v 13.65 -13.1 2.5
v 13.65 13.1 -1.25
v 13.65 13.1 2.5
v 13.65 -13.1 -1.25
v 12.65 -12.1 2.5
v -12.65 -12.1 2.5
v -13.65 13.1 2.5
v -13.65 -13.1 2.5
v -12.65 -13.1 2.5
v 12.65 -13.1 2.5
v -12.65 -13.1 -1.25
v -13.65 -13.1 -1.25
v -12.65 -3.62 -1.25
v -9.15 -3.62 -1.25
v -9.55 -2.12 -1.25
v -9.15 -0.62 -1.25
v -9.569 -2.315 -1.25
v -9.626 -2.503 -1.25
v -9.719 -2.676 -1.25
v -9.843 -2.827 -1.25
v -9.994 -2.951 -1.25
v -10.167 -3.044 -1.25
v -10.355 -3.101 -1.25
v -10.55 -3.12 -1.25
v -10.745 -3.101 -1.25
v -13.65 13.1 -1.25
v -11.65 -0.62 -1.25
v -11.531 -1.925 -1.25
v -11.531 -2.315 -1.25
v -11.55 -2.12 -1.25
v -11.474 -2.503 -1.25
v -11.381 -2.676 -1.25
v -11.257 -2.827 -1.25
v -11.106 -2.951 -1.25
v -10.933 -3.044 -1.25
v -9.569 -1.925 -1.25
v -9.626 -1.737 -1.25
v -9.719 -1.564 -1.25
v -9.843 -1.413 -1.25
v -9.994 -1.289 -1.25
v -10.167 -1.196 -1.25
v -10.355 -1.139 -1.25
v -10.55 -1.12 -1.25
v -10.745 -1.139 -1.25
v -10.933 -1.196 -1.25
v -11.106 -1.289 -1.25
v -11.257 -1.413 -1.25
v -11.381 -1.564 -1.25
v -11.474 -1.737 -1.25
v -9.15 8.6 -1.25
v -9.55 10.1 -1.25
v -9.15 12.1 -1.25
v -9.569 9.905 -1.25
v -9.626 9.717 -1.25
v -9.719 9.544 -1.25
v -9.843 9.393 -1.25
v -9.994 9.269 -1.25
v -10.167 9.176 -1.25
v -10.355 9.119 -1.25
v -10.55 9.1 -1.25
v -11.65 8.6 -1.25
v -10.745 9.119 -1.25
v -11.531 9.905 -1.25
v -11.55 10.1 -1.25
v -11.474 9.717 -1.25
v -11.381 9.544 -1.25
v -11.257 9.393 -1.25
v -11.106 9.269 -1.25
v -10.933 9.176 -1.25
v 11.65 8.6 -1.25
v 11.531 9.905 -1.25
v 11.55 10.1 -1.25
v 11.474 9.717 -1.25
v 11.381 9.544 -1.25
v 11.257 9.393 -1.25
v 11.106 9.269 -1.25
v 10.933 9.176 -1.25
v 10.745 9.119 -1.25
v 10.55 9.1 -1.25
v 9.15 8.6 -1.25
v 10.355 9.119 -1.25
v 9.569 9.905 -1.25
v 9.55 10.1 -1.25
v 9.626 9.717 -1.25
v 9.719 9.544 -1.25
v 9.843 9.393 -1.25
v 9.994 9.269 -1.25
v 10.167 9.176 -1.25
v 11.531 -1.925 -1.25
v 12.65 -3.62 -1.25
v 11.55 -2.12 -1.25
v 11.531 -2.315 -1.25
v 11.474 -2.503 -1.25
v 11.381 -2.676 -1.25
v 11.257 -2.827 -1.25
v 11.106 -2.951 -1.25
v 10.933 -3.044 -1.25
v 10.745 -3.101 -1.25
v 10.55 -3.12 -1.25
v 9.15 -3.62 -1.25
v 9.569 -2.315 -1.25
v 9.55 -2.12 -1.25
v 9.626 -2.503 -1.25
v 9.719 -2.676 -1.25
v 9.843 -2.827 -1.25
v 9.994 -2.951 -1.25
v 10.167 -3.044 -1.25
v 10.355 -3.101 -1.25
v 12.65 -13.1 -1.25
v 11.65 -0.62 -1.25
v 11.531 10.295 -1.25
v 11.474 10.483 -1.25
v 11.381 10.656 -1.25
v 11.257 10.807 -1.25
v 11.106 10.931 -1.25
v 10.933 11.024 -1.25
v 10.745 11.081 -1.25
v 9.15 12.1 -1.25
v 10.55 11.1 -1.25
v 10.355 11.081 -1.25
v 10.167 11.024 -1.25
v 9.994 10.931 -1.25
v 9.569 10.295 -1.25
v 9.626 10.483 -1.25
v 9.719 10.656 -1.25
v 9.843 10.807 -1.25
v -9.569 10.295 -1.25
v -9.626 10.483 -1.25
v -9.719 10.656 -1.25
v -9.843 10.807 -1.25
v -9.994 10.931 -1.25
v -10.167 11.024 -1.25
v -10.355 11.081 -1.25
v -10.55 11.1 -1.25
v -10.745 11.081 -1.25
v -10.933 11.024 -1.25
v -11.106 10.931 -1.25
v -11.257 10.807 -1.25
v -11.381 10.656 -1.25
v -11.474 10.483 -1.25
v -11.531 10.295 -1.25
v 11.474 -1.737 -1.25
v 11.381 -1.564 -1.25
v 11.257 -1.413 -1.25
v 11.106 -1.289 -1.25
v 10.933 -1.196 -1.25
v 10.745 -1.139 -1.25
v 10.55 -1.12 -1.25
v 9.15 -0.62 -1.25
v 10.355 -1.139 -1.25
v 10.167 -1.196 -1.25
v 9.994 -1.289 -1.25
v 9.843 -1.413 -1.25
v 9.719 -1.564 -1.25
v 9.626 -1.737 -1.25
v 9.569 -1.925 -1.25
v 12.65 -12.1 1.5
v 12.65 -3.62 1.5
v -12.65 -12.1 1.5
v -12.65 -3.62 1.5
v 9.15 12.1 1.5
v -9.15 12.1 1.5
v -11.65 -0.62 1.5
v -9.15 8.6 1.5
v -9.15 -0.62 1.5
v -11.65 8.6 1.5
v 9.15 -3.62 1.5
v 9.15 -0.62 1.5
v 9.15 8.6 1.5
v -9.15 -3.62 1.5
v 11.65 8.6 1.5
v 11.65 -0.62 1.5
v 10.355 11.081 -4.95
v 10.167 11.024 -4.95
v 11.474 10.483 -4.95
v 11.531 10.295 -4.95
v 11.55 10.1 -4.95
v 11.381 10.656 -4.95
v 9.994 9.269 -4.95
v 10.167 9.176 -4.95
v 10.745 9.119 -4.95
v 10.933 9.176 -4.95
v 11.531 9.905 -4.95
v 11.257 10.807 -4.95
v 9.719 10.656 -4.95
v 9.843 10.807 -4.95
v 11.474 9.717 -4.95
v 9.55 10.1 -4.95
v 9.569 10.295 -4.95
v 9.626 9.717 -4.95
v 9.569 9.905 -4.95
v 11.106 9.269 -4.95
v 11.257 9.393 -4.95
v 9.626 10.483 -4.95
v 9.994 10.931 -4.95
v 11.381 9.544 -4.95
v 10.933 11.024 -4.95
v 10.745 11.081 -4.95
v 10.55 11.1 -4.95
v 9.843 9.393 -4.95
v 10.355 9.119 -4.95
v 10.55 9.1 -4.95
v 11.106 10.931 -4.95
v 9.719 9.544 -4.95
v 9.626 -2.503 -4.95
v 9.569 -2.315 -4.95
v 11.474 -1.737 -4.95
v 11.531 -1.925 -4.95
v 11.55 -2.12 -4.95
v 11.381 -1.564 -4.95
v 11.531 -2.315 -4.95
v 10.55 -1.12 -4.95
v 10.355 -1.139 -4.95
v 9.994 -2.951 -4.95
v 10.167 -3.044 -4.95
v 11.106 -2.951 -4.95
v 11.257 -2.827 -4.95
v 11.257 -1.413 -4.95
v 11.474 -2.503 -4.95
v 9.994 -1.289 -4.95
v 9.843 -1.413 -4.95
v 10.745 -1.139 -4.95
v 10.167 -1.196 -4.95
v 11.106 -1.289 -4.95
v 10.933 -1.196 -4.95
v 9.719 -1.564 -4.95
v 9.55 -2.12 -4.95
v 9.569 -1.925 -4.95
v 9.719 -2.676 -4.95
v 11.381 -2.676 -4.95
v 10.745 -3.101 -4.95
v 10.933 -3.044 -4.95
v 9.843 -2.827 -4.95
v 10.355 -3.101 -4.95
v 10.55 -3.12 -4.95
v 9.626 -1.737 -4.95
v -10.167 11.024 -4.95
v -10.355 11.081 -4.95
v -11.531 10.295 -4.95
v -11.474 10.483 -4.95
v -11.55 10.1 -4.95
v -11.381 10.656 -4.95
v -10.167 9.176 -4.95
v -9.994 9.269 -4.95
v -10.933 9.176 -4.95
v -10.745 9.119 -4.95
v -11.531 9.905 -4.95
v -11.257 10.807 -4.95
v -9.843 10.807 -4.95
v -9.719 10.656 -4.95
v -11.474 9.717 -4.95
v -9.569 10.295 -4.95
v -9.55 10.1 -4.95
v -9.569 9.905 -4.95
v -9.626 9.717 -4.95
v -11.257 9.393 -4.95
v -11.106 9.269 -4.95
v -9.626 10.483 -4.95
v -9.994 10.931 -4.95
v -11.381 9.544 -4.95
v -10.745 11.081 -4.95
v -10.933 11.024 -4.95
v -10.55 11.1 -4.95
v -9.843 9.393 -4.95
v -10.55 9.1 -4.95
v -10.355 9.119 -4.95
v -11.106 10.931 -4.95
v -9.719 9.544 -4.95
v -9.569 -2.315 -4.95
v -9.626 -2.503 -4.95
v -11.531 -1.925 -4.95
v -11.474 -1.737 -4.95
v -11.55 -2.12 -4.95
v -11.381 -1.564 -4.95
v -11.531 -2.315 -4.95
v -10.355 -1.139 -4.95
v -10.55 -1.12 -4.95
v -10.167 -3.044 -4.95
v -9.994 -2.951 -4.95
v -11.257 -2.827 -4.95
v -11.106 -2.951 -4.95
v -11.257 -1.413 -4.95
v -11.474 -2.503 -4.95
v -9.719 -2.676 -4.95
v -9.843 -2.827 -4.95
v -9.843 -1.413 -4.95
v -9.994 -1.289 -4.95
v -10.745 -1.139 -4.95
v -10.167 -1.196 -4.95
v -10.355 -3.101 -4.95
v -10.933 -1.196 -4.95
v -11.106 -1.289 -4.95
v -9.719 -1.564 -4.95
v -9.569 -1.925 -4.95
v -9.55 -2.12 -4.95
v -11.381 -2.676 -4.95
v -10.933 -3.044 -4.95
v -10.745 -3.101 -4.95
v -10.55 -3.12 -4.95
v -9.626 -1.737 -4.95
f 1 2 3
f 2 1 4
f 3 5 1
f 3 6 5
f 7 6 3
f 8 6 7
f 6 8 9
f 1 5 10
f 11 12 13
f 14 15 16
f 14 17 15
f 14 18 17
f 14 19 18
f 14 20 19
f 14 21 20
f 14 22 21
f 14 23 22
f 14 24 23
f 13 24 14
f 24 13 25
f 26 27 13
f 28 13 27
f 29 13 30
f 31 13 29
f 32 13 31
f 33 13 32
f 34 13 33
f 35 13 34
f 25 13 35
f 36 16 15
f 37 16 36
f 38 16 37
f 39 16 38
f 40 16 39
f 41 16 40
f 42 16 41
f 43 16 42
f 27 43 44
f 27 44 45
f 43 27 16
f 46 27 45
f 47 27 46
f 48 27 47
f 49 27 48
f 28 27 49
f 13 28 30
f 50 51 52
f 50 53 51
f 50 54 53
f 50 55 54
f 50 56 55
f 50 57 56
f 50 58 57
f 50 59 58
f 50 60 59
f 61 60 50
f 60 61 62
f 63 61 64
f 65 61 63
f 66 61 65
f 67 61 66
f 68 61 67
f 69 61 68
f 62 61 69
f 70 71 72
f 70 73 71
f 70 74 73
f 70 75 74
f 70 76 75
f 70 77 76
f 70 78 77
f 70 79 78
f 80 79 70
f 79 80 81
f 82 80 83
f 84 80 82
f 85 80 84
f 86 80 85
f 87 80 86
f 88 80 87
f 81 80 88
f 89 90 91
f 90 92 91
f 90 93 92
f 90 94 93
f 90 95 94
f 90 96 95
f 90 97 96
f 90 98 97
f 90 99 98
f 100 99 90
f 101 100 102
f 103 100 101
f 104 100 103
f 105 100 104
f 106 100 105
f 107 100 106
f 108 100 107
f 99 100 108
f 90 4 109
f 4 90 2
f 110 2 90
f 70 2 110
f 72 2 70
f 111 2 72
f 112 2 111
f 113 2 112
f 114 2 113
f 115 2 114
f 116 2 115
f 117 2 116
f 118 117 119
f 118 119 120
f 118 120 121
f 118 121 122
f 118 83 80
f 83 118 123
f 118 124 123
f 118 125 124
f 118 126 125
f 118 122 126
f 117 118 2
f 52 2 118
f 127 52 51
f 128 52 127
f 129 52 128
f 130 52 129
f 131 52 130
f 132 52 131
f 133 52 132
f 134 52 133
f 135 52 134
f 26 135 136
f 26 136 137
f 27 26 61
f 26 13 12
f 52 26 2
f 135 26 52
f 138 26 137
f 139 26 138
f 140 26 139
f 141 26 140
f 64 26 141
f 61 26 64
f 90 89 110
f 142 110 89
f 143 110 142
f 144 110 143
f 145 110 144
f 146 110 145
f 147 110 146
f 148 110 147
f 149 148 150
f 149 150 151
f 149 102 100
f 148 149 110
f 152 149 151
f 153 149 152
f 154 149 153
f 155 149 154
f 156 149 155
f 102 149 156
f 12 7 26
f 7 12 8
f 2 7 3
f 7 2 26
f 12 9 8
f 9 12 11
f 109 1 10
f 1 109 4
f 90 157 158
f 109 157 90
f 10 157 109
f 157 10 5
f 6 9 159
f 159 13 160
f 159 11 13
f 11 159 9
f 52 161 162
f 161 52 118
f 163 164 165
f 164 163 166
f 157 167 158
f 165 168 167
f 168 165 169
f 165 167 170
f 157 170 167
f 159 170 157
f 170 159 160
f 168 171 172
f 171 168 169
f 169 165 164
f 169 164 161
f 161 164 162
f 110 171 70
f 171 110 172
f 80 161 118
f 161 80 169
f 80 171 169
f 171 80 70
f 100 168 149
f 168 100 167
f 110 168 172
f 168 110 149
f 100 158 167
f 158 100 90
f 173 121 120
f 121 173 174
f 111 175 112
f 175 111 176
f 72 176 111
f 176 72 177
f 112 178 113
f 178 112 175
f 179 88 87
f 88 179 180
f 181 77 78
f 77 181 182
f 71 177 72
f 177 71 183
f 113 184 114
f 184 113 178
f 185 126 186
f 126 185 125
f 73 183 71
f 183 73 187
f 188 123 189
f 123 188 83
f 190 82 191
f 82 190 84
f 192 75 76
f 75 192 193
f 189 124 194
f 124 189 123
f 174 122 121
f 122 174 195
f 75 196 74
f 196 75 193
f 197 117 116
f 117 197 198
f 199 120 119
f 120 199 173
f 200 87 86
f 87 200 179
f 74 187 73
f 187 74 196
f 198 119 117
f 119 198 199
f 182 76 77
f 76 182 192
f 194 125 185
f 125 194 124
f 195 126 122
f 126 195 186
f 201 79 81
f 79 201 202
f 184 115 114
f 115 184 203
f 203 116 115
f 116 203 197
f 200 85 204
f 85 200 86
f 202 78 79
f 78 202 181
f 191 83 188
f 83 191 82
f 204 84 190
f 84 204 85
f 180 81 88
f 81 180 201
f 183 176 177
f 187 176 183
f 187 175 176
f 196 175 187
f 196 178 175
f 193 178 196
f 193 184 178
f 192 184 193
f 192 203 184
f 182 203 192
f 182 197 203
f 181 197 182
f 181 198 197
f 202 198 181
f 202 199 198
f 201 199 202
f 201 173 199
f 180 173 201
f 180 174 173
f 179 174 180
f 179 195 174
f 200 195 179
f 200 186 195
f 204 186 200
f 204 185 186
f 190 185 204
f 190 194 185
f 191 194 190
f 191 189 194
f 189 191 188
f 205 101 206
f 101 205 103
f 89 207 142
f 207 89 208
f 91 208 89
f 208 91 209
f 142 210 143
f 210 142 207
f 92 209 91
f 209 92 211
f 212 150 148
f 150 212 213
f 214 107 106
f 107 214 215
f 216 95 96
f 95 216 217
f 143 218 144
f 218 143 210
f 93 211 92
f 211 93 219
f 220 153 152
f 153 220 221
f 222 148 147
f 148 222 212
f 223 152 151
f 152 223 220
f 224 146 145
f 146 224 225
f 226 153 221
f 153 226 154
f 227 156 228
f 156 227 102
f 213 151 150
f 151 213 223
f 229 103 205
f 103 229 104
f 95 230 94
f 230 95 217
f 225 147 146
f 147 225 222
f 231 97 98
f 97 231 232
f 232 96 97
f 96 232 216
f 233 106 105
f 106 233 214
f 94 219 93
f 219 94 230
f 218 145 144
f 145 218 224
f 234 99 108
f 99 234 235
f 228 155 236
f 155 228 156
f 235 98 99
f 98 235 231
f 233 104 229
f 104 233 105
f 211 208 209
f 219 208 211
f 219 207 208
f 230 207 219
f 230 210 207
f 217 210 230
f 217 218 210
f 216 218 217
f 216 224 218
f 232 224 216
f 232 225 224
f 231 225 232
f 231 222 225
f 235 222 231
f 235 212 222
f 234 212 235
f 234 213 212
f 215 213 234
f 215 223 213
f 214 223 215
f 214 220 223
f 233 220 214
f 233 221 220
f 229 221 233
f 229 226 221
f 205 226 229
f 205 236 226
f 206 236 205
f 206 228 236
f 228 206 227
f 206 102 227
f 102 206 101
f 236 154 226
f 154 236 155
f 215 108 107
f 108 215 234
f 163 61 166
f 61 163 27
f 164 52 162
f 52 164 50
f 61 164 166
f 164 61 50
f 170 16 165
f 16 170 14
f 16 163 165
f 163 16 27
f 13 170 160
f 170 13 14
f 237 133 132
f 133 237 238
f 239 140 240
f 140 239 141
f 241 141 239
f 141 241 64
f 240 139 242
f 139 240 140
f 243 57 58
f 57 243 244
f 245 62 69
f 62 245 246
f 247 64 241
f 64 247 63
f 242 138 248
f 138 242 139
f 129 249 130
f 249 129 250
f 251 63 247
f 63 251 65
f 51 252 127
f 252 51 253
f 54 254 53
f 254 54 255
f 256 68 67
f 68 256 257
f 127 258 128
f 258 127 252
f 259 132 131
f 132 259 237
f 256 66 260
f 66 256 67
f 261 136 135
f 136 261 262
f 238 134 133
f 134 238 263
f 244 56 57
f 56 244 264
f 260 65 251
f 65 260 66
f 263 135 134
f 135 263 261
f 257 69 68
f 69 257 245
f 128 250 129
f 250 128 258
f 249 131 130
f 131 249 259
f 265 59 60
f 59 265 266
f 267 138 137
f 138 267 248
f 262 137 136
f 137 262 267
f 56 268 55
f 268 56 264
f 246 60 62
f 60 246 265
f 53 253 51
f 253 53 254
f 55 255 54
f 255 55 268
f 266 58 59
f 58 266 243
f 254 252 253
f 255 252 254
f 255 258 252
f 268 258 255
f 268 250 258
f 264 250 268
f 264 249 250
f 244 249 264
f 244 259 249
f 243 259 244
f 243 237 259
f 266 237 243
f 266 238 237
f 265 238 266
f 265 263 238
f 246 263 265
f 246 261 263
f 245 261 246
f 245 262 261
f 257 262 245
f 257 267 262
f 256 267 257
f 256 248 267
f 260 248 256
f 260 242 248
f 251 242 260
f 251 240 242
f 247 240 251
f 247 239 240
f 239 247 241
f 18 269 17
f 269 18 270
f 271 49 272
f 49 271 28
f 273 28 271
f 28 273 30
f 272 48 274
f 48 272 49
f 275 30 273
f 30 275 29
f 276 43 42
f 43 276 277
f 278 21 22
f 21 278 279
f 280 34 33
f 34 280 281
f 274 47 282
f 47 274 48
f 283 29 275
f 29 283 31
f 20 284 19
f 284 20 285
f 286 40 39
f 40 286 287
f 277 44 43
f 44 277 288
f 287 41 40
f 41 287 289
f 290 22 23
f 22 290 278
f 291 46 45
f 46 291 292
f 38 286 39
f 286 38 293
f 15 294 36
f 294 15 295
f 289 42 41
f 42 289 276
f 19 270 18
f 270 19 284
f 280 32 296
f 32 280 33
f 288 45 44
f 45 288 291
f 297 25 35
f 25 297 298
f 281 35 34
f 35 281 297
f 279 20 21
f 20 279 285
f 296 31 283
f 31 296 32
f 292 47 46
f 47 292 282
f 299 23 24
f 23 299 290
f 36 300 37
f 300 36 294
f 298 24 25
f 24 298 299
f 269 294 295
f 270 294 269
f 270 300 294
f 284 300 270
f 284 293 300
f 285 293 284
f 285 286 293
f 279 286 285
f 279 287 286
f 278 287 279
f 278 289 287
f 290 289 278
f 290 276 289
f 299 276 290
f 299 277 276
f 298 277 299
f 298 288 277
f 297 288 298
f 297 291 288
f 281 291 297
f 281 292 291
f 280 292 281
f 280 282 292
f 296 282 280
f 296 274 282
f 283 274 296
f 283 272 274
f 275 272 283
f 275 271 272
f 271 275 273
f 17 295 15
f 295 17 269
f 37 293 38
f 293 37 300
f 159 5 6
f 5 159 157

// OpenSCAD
CAMERA_WIDTH = 25.3;
CAMERA_LENGTH = 24.2;
CAMERA_PCB_HEIGHT = 1.7;
CAMERA_PCB_AND_RIBBON_HEIGHT = 4.45;

TOP_THROUGH_HOLE_MARGIN = 1;
THROUGH_HOLE_RADIUS = 1;

translate([0, 0, 2]) {
    cube([CAMERA_WIDTH, CAMERA_LENGTH, 1], center=true);
}

difference() {
    translate([0, 0, 2.5 - (pcb_leeway + 1)/2]) {
        cube([CAMERA_WIDTH + 2, CAMERA_LENGTH + 2, pcb_leeway + 1], center=true);
    }
    translate([0, 0, 2.5 - (pcb_leeway + 1)/2]) {
        cube([CAMERA_WIDTH, CAMERA_LENGTH, pcb_leeway + 2], center=true);
    }
    translate([0, -5, 2.5 - (pcb_leeway + 1)/2]) {
        cube([CAMERA_WIDTH, CAMERA_LENGTH, pcb_leeway + 2], center=true);
    }
}

pcb_leeway = CAMERA_PCB_AND_RIBBON_HEIGHT - CAMERA_PCB_HEIGHT;

peg_length = pcb_leeway + 2 + CAMERA_PCB_HEIGHT;
peg_length_diff = peg_length - pcb_leeway;

module standoffs() {
    translate([CAMERA_WIDTH/2 - 0.5, 4, pcb_leeway/2 - 1.25]) {
        cube([1, 14, pcb_leeway], center=true);
    }

    translate([CAMERA_WIDTH/2 - 1.5, CAMERA_LENGTH/2 - 1.5, pcb_leeway/2 - 1.25]) {
        cube([4, 4, pcb_leeway], center=true);
    }

    translate([CAMERA_WIDTH/2 - 1.5, CAMERA_LENGTH/2 - 1 - 13.22, pcb_leeway/2 - 1.25]) {
        cube([4, 3, pcb_leeway], center=true);
    }

    translate([CAMERA_WIDTH/2 - THROUGH_HOLE_RADIUS - TOP_THROUGH_HOLE_MARGIN - 0.1, CAMERA_LENGTH/2 - THROUGH_HOLE_RADIUS - TOP_THROUGH_HOLE_MARGIN, peg_length/2 - 1.25 - peg_length_diff]) {
        cylinder(peg_length, THROUGH_HOLE_RADIUS, THROUGH_HOLE_RADIUS, center=true, $fn=32);
    }

    translate([CAMERA_WIDTH/2 - THROUGH_HOLE_RADIUS - TOP_THROUGH_HOLE_MARGIN - 0.1, CAMERA_LENGTH/2 - THROUGH_HOLE_RADIUS - 13.22, peg_length/2 - 1.25 - peg_length_diff]) {
        cylinder(peg_length, THROUGH_HOLE_RADIUS, THROUGH_HOLE_RADIUS, center=true, $fn=32);
    }
}

standoffs();

mirror([1, 0, 0]) {
    standoffs();
}
